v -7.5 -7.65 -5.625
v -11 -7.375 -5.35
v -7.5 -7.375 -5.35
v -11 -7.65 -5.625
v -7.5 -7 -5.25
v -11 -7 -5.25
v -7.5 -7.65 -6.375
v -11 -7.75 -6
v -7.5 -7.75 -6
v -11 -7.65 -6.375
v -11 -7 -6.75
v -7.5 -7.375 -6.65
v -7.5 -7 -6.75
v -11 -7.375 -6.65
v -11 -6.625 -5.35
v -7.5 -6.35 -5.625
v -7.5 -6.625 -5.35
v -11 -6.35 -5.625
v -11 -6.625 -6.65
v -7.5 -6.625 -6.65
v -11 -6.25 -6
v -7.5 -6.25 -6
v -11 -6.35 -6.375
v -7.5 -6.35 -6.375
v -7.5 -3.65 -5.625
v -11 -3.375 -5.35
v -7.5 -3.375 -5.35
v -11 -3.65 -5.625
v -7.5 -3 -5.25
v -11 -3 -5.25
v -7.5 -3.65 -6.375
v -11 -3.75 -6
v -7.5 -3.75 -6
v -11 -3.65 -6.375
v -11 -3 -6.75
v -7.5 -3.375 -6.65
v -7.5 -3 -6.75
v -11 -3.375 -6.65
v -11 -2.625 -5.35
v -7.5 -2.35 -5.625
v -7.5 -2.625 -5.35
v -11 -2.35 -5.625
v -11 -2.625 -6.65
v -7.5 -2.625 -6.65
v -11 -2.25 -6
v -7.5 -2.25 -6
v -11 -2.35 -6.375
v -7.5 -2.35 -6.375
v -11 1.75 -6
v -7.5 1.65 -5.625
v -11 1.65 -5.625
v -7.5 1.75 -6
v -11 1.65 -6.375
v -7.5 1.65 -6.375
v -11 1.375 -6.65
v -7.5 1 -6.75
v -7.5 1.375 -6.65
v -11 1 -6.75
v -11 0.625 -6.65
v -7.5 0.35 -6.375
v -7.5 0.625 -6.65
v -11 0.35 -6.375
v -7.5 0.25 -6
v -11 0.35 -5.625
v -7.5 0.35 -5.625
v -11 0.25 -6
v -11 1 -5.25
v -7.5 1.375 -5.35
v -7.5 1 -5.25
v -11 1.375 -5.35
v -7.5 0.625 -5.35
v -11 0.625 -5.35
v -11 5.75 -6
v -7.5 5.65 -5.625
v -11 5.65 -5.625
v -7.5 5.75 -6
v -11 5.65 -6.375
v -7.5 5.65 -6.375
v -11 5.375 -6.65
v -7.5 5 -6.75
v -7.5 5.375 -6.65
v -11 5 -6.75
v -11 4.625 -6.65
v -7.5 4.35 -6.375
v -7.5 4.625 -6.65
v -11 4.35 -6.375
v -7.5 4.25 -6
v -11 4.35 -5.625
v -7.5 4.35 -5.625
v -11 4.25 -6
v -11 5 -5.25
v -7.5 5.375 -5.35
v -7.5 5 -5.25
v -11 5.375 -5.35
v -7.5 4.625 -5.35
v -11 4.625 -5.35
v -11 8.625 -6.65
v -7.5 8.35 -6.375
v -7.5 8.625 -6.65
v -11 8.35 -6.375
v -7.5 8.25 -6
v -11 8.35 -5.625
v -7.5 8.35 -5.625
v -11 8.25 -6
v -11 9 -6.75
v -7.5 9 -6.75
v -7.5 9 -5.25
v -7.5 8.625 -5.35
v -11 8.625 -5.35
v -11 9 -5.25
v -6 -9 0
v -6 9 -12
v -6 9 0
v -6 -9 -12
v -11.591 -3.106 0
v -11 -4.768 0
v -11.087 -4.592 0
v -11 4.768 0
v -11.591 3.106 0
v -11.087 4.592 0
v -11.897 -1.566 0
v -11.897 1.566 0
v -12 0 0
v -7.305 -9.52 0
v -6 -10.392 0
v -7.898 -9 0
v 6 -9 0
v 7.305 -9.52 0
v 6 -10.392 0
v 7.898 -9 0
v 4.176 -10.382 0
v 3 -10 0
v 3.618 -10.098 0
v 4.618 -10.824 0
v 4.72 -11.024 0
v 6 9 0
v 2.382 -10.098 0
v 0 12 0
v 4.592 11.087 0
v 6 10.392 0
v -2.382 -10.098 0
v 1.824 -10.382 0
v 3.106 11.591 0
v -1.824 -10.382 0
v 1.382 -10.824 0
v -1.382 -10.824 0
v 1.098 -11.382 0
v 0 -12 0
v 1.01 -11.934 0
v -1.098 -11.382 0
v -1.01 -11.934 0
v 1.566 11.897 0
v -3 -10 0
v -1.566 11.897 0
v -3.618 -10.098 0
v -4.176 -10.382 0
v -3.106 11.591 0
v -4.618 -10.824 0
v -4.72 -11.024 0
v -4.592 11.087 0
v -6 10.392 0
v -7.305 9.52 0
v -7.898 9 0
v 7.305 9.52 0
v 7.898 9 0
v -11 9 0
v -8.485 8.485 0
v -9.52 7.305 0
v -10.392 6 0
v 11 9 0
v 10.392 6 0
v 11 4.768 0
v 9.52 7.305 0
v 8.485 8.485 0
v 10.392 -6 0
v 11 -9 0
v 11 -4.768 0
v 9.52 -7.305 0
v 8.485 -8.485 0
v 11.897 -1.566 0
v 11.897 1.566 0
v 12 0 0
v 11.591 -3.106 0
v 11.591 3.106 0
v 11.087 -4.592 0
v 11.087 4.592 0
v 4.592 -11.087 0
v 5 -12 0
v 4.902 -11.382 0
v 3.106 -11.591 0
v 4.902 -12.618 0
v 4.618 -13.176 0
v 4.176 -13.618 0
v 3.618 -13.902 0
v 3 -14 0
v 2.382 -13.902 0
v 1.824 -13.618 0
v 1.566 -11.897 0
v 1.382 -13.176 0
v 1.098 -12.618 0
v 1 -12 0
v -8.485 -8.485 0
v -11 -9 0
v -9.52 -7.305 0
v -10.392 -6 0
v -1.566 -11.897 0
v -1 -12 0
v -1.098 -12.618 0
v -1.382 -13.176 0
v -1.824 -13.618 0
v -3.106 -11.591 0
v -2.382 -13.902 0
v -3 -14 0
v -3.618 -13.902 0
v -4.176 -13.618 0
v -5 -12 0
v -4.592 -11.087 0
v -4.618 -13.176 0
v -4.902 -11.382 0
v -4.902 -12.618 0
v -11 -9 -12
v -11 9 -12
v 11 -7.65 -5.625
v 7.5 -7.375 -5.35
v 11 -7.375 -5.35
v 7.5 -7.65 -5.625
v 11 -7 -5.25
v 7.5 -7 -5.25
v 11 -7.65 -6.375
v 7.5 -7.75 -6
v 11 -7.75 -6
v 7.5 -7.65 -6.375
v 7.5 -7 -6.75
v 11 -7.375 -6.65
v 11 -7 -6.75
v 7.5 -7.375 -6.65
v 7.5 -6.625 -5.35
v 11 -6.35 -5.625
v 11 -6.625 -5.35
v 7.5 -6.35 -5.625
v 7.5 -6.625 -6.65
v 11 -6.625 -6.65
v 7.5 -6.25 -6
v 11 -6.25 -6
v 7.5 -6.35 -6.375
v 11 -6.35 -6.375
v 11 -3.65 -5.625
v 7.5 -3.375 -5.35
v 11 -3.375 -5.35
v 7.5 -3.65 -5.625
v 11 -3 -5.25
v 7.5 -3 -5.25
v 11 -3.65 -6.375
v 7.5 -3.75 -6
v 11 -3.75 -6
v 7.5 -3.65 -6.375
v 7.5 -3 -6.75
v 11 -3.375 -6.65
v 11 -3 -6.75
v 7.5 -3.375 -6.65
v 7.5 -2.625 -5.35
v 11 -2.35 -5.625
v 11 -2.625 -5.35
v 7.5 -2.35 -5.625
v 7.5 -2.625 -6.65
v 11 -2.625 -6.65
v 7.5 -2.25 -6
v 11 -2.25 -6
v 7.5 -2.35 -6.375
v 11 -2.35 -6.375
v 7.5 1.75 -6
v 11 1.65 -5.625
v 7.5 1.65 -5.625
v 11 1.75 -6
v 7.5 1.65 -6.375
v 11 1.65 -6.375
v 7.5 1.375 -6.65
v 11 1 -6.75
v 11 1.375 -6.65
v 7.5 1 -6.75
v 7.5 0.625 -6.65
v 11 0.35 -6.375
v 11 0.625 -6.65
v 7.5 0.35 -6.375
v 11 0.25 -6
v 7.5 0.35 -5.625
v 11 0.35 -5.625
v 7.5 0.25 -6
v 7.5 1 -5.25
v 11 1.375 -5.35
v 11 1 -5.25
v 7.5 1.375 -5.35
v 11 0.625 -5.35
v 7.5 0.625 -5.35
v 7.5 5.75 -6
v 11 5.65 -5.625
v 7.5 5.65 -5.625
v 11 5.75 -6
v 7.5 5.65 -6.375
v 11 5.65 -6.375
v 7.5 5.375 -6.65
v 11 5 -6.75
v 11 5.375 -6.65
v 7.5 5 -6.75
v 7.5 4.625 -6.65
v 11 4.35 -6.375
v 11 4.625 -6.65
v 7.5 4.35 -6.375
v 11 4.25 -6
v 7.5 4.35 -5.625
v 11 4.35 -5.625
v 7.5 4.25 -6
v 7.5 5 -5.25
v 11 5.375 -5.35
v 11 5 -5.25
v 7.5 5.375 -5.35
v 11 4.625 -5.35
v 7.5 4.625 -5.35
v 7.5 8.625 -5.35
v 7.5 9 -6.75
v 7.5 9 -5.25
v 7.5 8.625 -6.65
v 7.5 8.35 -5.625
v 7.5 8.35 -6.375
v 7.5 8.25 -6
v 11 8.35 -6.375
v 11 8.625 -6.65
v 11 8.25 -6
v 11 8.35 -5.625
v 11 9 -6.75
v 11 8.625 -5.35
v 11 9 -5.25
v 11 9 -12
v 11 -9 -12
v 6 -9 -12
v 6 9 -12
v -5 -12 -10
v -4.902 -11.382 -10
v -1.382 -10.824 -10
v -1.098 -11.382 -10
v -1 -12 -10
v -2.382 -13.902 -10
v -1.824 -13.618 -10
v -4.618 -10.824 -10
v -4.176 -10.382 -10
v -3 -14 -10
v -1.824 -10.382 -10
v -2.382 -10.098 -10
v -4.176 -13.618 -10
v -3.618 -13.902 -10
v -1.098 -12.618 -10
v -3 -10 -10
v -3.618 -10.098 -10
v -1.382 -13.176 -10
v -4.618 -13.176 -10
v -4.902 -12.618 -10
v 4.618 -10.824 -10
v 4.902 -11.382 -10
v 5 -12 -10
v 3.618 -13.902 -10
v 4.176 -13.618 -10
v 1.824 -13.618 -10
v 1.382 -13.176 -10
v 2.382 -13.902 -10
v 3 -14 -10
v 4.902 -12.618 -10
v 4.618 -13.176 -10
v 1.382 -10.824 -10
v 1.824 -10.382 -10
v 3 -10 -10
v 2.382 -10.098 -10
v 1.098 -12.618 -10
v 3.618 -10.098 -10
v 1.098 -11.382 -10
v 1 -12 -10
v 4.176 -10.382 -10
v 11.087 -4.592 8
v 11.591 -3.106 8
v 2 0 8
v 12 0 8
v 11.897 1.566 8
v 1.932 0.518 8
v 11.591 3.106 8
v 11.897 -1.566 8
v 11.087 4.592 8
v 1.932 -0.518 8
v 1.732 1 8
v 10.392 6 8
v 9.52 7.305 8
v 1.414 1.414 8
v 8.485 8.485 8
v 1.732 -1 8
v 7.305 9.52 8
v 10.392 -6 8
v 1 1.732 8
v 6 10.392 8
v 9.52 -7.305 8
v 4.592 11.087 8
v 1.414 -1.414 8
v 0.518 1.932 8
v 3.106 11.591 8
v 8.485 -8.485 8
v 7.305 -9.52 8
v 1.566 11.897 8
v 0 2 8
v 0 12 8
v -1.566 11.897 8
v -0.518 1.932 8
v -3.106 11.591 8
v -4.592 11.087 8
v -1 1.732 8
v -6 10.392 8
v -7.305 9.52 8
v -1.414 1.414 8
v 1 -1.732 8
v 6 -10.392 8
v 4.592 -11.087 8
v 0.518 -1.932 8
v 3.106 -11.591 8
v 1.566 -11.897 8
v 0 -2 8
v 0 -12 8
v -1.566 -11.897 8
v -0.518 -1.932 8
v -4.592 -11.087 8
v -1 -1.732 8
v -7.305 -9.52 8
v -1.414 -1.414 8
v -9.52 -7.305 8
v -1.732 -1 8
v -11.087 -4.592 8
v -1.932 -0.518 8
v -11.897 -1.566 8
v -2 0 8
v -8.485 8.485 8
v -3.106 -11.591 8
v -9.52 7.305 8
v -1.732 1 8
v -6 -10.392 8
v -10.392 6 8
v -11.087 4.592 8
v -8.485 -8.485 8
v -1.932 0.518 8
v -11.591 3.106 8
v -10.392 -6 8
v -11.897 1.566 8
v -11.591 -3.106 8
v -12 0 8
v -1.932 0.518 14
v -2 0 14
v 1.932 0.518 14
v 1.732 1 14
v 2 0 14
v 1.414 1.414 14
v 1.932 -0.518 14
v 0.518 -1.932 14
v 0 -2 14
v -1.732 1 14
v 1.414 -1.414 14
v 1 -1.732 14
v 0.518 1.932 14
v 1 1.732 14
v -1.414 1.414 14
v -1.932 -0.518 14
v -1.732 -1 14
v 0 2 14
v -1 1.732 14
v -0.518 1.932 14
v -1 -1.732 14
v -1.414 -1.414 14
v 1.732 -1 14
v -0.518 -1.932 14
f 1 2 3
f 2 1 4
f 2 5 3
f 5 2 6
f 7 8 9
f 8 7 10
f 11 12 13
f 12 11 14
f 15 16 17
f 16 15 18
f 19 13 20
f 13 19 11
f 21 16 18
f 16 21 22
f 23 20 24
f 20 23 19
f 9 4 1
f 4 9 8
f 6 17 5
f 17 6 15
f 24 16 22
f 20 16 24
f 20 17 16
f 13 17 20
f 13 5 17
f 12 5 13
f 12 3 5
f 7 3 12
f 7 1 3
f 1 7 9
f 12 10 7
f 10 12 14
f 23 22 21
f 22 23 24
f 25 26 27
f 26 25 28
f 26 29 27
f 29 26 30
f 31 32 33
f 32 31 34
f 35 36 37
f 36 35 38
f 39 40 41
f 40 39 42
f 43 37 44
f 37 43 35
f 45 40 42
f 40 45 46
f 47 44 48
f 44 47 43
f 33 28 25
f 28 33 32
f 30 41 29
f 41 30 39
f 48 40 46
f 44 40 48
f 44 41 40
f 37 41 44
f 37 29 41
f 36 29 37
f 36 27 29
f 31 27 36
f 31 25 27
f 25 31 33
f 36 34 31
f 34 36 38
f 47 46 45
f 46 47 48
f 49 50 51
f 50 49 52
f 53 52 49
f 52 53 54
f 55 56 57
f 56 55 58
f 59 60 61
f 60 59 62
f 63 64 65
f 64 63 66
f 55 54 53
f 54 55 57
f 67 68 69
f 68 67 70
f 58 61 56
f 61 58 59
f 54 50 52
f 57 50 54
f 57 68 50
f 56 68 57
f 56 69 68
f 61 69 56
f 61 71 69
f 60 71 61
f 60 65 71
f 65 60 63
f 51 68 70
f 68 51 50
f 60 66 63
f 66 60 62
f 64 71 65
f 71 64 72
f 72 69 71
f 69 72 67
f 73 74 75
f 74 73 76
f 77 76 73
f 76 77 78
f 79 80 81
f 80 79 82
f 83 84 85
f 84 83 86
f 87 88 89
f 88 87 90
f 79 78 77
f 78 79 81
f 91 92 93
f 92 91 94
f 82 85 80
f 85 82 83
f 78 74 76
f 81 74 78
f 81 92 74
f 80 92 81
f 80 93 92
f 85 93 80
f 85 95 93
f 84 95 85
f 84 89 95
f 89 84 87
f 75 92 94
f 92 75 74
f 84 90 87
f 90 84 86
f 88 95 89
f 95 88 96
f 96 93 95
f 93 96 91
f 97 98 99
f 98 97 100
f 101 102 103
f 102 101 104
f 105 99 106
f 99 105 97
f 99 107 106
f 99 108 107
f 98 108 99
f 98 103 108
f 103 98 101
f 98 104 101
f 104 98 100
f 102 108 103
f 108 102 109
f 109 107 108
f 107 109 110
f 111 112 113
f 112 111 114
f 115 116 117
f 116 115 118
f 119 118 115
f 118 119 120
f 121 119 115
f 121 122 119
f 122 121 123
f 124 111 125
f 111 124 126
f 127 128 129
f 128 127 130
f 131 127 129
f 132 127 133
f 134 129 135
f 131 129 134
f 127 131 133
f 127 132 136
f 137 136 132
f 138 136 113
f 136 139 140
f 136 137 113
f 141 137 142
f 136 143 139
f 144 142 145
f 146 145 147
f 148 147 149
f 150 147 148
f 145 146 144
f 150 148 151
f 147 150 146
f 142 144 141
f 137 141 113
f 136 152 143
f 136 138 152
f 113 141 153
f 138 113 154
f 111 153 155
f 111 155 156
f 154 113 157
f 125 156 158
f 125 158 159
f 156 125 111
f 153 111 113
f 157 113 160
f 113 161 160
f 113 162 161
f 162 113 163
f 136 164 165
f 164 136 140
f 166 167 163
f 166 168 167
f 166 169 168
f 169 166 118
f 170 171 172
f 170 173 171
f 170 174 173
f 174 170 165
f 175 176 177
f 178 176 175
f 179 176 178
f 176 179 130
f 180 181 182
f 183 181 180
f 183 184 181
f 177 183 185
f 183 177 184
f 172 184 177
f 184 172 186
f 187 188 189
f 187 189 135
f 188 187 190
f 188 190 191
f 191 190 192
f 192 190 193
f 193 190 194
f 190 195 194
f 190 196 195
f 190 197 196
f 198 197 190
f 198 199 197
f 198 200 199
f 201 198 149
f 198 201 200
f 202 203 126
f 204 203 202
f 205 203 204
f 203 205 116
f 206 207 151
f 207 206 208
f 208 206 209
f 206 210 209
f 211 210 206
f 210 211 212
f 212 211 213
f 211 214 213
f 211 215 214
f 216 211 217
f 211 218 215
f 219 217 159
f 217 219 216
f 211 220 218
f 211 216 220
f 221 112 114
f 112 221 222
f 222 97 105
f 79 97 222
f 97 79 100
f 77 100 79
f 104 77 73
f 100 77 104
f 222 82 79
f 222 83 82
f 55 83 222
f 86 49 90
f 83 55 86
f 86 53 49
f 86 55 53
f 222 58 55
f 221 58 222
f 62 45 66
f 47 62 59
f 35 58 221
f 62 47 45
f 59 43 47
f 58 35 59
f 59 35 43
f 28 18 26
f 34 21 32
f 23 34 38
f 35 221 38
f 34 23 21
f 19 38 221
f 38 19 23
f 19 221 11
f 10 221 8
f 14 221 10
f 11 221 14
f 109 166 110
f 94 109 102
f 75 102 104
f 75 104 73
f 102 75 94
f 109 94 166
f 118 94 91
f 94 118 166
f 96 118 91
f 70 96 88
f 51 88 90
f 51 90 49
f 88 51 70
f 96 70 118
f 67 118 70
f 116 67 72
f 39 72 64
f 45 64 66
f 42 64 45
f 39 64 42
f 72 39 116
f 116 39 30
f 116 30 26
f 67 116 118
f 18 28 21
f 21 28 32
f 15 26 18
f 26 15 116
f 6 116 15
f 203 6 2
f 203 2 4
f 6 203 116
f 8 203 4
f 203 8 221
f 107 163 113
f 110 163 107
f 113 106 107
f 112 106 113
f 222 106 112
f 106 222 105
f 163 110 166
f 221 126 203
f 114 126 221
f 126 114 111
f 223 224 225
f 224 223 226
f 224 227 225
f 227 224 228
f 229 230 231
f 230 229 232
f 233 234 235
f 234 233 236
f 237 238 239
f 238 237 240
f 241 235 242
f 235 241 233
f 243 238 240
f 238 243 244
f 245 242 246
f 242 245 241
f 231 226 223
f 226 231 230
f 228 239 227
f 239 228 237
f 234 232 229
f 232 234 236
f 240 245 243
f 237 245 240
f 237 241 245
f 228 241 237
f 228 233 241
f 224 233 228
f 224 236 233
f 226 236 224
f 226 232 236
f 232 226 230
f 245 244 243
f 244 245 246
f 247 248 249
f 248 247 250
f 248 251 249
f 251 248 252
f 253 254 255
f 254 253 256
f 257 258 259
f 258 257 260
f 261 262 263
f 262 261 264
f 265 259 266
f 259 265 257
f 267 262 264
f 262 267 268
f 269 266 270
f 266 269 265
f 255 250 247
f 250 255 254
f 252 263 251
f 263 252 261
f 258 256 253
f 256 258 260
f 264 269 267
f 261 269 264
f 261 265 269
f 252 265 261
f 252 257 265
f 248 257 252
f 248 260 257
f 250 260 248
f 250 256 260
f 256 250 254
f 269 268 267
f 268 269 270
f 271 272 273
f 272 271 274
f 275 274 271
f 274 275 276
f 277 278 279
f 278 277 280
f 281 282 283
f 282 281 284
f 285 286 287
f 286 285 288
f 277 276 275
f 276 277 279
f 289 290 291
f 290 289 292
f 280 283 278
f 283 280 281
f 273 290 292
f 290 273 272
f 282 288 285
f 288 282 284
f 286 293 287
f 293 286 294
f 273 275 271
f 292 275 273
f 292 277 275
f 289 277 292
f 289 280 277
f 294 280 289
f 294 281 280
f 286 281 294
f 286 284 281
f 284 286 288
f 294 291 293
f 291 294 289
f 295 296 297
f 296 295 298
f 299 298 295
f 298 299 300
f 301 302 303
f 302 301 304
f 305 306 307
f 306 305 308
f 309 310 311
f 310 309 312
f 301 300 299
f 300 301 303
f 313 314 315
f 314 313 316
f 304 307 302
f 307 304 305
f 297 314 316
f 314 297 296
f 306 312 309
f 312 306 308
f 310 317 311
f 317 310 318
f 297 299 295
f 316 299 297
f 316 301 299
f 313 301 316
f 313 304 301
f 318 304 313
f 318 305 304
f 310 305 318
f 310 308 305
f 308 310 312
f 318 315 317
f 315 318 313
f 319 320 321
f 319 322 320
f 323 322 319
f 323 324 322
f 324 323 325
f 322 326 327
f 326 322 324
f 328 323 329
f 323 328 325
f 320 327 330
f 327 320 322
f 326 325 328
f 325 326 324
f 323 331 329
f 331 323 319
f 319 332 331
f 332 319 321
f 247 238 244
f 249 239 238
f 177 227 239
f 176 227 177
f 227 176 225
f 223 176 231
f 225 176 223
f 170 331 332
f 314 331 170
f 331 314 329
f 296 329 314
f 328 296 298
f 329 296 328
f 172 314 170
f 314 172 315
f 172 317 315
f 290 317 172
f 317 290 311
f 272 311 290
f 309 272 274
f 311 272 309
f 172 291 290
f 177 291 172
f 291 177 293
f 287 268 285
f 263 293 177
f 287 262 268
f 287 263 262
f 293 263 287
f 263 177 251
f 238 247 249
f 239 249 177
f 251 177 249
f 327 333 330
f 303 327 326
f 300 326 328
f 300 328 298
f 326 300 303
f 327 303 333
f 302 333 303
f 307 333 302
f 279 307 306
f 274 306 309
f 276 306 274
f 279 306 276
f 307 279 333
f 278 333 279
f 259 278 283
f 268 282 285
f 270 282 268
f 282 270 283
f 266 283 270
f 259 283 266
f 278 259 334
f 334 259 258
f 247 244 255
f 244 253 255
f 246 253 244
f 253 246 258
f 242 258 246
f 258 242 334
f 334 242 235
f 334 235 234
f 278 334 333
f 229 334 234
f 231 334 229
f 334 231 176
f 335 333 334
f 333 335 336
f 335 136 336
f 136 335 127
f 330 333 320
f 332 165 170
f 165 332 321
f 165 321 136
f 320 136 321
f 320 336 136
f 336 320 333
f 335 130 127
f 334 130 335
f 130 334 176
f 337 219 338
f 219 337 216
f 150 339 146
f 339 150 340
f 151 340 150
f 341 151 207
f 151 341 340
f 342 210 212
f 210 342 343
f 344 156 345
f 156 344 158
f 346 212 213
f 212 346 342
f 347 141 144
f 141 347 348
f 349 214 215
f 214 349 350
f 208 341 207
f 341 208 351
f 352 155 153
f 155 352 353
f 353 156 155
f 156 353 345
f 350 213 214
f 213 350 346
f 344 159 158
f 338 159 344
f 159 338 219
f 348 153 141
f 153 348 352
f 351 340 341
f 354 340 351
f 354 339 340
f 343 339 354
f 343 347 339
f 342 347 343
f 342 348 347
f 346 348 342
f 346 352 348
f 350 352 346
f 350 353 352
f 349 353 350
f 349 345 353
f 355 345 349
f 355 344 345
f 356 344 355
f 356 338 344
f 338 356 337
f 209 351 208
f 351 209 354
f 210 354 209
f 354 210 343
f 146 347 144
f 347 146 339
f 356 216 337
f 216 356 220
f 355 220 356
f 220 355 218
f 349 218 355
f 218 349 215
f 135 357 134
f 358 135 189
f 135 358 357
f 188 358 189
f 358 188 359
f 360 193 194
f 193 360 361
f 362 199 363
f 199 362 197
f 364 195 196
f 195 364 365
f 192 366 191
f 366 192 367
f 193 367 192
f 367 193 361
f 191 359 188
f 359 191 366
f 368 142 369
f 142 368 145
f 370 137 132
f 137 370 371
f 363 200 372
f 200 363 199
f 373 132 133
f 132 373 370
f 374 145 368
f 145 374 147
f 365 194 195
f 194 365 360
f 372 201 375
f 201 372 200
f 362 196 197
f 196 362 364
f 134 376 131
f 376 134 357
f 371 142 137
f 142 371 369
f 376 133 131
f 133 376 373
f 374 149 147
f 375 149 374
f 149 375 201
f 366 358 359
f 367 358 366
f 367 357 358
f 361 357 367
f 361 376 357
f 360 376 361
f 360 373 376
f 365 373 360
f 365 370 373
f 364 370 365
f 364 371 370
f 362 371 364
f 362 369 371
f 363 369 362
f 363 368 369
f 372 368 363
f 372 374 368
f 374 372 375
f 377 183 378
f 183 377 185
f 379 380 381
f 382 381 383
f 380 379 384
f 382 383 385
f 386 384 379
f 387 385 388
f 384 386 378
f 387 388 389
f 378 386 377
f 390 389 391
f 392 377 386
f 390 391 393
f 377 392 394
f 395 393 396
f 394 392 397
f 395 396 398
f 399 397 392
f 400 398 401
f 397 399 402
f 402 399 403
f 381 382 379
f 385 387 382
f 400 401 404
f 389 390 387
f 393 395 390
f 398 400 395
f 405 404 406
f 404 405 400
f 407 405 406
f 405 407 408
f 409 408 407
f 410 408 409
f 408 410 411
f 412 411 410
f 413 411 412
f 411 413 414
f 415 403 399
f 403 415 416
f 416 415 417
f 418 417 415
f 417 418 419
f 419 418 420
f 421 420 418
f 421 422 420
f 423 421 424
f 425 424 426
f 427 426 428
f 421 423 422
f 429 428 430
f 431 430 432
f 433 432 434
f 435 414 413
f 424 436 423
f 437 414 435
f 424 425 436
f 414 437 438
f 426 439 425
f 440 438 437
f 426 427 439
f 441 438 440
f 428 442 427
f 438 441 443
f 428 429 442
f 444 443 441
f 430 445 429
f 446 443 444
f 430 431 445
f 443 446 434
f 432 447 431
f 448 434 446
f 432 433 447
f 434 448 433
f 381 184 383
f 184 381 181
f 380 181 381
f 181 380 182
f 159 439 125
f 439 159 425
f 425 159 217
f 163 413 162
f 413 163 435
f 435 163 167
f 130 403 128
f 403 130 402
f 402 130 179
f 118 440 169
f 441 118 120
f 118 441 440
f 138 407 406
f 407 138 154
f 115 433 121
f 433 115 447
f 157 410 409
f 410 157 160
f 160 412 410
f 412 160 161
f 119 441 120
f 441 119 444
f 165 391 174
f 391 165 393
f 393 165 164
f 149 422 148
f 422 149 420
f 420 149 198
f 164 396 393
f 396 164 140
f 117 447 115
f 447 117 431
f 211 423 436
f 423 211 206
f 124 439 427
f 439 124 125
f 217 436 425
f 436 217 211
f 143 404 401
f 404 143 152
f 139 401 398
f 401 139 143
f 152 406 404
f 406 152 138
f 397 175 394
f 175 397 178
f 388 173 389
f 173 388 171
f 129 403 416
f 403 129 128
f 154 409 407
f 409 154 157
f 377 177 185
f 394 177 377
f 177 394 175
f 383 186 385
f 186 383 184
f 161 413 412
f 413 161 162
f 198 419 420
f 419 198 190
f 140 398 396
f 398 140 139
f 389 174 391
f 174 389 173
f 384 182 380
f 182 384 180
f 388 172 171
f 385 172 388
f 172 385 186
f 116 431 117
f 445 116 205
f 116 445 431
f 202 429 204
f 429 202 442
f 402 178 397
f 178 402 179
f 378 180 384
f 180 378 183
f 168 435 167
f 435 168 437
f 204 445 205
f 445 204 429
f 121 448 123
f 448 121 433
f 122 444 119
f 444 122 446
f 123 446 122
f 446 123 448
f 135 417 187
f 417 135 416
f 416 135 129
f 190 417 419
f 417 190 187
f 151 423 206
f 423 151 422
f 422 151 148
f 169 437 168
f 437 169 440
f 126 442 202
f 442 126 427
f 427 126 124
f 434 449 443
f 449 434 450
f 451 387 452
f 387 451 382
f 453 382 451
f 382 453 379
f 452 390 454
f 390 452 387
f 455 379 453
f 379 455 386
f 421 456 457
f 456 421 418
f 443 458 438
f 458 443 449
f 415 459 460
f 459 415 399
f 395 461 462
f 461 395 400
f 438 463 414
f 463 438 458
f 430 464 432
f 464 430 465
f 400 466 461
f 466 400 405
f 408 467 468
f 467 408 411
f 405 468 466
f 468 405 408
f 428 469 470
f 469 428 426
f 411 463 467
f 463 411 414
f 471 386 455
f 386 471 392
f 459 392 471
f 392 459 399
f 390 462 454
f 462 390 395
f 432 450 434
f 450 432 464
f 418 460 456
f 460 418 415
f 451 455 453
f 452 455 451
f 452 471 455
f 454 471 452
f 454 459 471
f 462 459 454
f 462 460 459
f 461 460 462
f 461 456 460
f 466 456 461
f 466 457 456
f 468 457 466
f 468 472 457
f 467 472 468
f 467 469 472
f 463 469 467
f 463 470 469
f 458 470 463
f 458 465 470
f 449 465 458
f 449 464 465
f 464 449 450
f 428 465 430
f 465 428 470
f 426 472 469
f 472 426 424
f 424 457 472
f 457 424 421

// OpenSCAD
// Parametric end-effector tool head for the MyZubster assembly line arm.
// Swappable heads: gripper, welding tip, board press, firmware flash dock.
// Issue #80 task: Scrivere codice per braccio meccanico.
// Print in PETG, 60% infill; snap onto the arm wrist mount.

// Parameters (mm)
head_base_dia = 24;        // base mounting disk diameter
head_base_h = 8;          // base thickness
gripper_jaw_l = 18;      // gripper jaw length
gripper_jaw_w = 5;      // gripper jaw width
gripper_jaw_h = 12;     // gripper jaw height
gripper_gap = 12;       // gap between jaws (open position)
probe_dia = 4;          // spring probe diameter for flash dock
probe_l = 10;           // spring probe length
mount_pin_dia = 4;      // wrist mount pin
$fn = 48;

module tool_head() {
  // base disk
  cylinder(h = head_base_h, d = head_base_dia);
  // wrist mount pin
  translate([0, 0, head_base_h])
    cylinder(h = 6, d = mount_pin_dia, $fn = 24);
  // gripper jaws (symmetric pair)
  for (sx = [-1, 1])
    translate([sx * (gripper_gap / 2 + gripper_jaw_w / 2), 0, -gripper_jaw_h / 2])
      difference() {
        cube([gripper_jaw_w, gripper_jaw_l, gripper_jaw_h], center = true);
        // grip serration cutouts
        translate([0, 0, 0])
          for (yz = [-2 : 4 : gripper_jaw_l + 2])
            translate([sx * gripper_jaw_w / 2, yz - gripper_jaw_l / 2, 0])
              rotate([0, 90, 0])
                cylinder(h = gripper_jaw_w + 2, d = 1.5, $fn = 12, center = true);
      }
  // spring probes (for flash dock)
  for (px = [-1, 1])
    translate([px * 3, -gripper_gap, -probe_l / 2])
      cylinder(h = probe_l, d = probe_dia, $fn = 20, center = true);
}

tool_head();
